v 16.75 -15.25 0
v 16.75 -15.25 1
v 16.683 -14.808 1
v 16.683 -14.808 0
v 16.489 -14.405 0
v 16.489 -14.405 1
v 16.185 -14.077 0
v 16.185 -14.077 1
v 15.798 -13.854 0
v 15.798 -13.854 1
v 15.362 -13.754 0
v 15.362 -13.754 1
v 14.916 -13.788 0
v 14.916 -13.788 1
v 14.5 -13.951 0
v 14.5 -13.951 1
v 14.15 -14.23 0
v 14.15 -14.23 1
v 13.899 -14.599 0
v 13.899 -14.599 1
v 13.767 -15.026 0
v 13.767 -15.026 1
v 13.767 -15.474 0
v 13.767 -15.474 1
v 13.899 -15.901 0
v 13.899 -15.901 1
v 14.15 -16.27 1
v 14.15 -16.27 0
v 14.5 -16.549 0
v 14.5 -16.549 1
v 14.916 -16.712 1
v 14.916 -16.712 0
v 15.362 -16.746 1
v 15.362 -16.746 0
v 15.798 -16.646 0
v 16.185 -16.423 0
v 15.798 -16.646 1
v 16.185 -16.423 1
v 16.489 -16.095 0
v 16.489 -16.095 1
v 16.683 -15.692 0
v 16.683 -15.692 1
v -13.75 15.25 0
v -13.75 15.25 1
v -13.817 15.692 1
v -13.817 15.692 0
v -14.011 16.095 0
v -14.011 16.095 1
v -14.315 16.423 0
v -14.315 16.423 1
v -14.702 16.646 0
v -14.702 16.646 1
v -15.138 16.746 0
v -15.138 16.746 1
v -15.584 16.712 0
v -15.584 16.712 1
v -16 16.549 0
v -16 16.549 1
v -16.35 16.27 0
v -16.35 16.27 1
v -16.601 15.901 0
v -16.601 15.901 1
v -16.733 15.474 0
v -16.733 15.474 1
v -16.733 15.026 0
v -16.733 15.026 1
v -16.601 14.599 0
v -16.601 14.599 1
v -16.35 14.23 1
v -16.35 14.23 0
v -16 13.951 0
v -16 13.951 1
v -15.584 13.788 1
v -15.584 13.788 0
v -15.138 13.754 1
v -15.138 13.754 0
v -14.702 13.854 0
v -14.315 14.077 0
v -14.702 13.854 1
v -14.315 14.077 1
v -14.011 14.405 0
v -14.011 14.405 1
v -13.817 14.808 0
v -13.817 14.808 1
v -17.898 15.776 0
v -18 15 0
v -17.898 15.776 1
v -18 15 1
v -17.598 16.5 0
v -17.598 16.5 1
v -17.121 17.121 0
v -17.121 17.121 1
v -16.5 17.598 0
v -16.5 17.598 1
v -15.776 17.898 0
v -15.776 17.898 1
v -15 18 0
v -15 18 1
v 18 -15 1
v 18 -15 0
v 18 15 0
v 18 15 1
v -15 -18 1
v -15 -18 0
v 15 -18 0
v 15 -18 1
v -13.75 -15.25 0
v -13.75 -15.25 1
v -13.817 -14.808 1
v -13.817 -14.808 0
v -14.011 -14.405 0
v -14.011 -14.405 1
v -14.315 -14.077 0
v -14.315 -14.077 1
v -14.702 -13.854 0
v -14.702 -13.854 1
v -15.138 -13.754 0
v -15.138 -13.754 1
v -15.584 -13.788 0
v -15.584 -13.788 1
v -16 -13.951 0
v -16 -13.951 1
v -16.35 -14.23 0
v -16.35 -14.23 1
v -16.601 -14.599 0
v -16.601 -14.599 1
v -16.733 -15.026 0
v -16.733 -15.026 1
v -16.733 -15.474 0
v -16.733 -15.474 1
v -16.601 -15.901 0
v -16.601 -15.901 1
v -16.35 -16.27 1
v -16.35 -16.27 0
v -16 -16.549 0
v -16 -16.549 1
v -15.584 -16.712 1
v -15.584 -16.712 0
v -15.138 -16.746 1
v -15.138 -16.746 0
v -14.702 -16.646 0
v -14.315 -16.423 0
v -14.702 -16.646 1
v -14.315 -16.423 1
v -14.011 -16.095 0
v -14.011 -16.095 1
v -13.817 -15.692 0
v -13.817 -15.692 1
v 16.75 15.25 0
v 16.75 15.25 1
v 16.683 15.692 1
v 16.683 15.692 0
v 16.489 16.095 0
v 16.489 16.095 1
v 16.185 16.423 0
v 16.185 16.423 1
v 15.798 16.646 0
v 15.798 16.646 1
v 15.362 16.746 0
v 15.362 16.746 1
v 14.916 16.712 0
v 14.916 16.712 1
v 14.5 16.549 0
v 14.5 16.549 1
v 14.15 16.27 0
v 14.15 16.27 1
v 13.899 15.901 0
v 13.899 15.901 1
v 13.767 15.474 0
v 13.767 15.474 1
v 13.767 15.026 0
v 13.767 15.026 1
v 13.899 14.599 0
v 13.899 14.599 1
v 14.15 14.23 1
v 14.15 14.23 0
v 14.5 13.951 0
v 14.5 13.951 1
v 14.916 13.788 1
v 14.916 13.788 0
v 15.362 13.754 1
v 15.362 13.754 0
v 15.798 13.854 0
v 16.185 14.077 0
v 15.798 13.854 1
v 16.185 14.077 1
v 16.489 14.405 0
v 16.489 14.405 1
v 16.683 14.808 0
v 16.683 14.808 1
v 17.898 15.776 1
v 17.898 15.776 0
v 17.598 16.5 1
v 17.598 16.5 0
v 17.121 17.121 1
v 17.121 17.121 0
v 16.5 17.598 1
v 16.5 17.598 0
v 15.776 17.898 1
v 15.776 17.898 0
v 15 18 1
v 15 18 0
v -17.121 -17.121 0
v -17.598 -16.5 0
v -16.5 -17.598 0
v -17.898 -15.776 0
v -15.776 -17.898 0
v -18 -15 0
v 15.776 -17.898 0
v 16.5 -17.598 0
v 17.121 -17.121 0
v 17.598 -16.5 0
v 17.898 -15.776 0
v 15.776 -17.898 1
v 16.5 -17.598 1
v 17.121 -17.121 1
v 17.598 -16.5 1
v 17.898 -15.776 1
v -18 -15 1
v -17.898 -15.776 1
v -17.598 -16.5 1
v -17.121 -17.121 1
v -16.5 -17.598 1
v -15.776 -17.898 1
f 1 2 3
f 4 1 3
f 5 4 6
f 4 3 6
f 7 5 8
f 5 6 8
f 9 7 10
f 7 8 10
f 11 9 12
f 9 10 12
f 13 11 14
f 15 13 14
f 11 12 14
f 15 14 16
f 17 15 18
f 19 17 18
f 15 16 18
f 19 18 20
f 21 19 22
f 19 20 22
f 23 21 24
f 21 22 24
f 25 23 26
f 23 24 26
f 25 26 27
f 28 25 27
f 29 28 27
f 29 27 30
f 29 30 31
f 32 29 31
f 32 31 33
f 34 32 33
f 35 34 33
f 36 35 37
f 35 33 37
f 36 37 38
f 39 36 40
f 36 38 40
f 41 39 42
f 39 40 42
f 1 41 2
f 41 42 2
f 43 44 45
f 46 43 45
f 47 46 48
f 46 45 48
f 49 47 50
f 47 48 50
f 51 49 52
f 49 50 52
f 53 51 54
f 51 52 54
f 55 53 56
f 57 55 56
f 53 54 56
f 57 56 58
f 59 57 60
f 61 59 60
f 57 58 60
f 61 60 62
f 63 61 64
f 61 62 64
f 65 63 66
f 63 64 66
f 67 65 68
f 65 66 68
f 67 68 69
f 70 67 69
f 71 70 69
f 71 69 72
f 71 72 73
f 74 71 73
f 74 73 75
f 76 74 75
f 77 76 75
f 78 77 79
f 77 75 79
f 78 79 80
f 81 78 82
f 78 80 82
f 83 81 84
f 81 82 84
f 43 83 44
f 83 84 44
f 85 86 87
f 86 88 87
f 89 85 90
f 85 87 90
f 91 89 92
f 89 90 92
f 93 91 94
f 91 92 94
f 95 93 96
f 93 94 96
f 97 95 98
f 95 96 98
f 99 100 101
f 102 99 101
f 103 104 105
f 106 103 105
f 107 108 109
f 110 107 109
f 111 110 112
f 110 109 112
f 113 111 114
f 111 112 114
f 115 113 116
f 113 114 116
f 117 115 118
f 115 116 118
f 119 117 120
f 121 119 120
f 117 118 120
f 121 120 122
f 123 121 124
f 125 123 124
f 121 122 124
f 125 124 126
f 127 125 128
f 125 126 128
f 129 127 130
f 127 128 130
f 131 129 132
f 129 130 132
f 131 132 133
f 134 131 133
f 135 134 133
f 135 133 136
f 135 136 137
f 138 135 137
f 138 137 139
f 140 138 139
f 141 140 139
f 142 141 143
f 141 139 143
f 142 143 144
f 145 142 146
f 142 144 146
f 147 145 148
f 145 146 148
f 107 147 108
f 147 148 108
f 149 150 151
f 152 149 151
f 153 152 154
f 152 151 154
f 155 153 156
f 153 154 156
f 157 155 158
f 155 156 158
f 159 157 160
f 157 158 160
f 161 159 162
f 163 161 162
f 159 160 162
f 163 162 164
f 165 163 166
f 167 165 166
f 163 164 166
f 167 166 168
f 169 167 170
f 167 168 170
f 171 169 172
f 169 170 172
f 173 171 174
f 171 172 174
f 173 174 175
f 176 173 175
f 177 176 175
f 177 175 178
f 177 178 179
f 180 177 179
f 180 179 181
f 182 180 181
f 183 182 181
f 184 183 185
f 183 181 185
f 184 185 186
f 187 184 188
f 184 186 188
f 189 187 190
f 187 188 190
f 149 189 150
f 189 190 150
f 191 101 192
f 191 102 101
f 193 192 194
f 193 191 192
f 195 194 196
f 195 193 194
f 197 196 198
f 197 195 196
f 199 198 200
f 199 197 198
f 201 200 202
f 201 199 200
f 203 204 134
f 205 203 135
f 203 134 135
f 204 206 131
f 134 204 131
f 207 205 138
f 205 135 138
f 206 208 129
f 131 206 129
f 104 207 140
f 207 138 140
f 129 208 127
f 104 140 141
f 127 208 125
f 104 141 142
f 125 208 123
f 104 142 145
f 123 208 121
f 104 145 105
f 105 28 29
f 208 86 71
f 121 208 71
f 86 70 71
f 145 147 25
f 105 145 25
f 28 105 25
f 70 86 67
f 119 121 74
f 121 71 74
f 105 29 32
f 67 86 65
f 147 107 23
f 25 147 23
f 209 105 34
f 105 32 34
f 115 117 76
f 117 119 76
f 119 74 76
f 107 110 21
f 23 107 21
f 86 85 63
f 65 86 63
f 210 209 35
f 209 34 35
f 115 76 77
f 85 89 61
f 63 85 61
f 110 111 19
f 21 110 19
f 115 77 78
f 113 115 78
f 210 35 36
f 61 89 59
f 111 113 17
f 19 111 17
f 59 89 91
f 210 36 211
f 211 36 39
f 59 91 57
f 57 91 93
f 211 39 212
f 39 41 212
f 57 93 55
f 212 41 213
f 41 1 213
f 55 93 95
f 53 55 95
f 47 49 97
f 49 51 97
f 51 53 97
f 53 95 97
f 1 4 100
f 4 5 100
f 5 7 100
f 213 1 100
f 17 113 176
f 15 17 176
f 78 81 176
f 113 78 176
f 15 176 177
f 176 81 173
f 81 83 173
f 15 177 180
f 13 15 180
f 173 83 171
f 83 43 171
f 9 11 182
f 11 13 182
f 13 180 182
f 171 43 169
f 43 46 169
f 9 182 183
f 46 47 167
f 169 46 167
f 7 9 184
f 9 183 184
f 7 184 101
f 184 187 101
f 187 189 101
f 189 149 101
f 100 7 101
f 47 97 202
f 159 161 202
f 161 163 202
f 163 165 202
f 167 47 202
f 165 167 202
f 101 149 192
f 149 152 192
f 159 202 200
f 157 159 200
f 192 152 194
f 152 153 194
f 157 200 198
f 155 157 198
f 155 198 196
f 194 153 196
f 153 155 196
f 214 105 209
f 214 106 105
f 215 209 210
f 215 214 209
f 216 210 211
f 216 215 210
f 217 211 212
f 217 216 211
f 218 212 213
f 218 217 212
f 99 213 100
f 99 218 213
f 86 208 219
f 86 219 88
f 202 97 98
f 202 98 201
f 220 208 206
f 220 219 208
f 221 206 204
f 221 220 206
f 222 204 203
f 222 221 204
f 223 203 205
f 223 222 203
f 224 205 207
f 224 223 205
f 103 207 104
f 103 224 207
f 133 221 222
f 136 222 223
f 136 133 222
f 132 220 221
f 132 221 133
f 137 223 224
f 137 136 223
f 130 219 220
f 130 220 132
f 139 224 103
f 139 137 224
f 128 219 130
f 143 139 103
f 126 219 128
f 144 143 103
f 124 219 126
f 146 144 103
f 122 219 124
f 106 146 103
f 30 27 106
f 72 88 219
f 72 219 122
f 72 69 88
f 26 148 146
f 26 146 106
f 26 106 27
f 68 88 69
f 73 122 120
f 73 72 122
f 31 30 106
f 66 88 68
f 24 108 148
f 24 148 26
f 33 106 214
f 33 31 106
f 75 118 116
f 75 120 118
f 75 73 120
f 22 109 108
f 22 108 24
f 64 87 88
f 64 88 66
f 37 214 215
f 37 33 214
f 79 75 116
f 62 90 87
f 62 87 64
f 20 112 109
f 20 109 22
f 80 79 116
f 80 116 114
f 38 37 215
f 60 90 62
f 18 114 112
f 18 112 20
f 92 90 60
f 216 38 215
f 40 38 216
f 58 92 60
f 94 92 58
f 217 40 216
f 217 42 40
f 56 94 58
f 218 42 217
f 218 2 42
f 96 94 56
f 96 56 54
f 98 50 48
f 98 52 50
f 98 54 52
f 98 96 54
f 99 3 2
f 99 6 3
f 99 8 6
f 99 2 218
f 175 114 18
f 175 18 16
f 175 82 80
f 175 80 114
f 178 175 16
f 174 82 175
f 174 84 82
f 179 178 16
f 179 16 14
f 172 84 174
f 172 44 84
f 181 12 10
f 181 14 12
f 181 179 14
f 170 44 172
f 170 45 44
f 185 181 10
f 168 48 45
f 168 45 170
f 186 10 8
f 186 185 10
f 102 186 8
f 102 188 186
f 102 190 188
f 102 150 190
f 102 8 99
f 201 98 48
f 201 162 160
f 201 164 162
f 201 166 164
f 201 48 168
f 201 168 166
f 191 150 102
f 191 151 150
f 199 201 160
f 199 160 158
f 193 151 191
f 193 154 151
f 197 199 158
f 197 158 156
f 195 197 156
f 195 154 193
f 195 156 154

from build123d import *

# Parameters (mm, degrees)
SKETCH_1_W          = 36
SKETCH_1_H          = 36
EXTRUDE_1_DEPTH     = 1
FILLET_1_R          = 3
SKETCH_2_R          = 1.5
CUT_EXTRUDE_1_DEPTH = 1


with BuildPart() as part:
    # 草图1 → 凸台-拉伸1 (new body)
    with BuildSketch(Plane.XY):
        Rectangle(SKETCH_1_W, SKETCH_1_H)
    extrude(amount=EXTRUDE_1_DEPTH)

    # 圆角1
    fillet_1_edges = [part.edges().sort_by_distance(p)[0] for p in [
        (-18, 18, 0.5),
        (18, 18, 0.5),
        (18, -18, 0.5),
        (-18, -18, 0.5),
    ]]
    fillet(fillet_1_edges, radius=FILLET_1_R)

    # 草图2 → 切除-拉伸1 (cut)
    with BuildSketch(Plane.XY.offset(1)):
        with Locations((-15.25, 15.25)):
            Circle(SKETCH_2_R)
        with Locations((15.25, 15.25)):
            Circle(SKETCH_2_R)
        with Locations((15.25, -15.25)):
            Circle(SKETCH_2_R)
        with Locations((-15.25, -15.25)):
            Circle(SKETCH_2_R)
    extrude(amount=-CUT_EXTRUDE_1_DEPTH, mode=Mode.SUBTRACT)


solid = part.part
